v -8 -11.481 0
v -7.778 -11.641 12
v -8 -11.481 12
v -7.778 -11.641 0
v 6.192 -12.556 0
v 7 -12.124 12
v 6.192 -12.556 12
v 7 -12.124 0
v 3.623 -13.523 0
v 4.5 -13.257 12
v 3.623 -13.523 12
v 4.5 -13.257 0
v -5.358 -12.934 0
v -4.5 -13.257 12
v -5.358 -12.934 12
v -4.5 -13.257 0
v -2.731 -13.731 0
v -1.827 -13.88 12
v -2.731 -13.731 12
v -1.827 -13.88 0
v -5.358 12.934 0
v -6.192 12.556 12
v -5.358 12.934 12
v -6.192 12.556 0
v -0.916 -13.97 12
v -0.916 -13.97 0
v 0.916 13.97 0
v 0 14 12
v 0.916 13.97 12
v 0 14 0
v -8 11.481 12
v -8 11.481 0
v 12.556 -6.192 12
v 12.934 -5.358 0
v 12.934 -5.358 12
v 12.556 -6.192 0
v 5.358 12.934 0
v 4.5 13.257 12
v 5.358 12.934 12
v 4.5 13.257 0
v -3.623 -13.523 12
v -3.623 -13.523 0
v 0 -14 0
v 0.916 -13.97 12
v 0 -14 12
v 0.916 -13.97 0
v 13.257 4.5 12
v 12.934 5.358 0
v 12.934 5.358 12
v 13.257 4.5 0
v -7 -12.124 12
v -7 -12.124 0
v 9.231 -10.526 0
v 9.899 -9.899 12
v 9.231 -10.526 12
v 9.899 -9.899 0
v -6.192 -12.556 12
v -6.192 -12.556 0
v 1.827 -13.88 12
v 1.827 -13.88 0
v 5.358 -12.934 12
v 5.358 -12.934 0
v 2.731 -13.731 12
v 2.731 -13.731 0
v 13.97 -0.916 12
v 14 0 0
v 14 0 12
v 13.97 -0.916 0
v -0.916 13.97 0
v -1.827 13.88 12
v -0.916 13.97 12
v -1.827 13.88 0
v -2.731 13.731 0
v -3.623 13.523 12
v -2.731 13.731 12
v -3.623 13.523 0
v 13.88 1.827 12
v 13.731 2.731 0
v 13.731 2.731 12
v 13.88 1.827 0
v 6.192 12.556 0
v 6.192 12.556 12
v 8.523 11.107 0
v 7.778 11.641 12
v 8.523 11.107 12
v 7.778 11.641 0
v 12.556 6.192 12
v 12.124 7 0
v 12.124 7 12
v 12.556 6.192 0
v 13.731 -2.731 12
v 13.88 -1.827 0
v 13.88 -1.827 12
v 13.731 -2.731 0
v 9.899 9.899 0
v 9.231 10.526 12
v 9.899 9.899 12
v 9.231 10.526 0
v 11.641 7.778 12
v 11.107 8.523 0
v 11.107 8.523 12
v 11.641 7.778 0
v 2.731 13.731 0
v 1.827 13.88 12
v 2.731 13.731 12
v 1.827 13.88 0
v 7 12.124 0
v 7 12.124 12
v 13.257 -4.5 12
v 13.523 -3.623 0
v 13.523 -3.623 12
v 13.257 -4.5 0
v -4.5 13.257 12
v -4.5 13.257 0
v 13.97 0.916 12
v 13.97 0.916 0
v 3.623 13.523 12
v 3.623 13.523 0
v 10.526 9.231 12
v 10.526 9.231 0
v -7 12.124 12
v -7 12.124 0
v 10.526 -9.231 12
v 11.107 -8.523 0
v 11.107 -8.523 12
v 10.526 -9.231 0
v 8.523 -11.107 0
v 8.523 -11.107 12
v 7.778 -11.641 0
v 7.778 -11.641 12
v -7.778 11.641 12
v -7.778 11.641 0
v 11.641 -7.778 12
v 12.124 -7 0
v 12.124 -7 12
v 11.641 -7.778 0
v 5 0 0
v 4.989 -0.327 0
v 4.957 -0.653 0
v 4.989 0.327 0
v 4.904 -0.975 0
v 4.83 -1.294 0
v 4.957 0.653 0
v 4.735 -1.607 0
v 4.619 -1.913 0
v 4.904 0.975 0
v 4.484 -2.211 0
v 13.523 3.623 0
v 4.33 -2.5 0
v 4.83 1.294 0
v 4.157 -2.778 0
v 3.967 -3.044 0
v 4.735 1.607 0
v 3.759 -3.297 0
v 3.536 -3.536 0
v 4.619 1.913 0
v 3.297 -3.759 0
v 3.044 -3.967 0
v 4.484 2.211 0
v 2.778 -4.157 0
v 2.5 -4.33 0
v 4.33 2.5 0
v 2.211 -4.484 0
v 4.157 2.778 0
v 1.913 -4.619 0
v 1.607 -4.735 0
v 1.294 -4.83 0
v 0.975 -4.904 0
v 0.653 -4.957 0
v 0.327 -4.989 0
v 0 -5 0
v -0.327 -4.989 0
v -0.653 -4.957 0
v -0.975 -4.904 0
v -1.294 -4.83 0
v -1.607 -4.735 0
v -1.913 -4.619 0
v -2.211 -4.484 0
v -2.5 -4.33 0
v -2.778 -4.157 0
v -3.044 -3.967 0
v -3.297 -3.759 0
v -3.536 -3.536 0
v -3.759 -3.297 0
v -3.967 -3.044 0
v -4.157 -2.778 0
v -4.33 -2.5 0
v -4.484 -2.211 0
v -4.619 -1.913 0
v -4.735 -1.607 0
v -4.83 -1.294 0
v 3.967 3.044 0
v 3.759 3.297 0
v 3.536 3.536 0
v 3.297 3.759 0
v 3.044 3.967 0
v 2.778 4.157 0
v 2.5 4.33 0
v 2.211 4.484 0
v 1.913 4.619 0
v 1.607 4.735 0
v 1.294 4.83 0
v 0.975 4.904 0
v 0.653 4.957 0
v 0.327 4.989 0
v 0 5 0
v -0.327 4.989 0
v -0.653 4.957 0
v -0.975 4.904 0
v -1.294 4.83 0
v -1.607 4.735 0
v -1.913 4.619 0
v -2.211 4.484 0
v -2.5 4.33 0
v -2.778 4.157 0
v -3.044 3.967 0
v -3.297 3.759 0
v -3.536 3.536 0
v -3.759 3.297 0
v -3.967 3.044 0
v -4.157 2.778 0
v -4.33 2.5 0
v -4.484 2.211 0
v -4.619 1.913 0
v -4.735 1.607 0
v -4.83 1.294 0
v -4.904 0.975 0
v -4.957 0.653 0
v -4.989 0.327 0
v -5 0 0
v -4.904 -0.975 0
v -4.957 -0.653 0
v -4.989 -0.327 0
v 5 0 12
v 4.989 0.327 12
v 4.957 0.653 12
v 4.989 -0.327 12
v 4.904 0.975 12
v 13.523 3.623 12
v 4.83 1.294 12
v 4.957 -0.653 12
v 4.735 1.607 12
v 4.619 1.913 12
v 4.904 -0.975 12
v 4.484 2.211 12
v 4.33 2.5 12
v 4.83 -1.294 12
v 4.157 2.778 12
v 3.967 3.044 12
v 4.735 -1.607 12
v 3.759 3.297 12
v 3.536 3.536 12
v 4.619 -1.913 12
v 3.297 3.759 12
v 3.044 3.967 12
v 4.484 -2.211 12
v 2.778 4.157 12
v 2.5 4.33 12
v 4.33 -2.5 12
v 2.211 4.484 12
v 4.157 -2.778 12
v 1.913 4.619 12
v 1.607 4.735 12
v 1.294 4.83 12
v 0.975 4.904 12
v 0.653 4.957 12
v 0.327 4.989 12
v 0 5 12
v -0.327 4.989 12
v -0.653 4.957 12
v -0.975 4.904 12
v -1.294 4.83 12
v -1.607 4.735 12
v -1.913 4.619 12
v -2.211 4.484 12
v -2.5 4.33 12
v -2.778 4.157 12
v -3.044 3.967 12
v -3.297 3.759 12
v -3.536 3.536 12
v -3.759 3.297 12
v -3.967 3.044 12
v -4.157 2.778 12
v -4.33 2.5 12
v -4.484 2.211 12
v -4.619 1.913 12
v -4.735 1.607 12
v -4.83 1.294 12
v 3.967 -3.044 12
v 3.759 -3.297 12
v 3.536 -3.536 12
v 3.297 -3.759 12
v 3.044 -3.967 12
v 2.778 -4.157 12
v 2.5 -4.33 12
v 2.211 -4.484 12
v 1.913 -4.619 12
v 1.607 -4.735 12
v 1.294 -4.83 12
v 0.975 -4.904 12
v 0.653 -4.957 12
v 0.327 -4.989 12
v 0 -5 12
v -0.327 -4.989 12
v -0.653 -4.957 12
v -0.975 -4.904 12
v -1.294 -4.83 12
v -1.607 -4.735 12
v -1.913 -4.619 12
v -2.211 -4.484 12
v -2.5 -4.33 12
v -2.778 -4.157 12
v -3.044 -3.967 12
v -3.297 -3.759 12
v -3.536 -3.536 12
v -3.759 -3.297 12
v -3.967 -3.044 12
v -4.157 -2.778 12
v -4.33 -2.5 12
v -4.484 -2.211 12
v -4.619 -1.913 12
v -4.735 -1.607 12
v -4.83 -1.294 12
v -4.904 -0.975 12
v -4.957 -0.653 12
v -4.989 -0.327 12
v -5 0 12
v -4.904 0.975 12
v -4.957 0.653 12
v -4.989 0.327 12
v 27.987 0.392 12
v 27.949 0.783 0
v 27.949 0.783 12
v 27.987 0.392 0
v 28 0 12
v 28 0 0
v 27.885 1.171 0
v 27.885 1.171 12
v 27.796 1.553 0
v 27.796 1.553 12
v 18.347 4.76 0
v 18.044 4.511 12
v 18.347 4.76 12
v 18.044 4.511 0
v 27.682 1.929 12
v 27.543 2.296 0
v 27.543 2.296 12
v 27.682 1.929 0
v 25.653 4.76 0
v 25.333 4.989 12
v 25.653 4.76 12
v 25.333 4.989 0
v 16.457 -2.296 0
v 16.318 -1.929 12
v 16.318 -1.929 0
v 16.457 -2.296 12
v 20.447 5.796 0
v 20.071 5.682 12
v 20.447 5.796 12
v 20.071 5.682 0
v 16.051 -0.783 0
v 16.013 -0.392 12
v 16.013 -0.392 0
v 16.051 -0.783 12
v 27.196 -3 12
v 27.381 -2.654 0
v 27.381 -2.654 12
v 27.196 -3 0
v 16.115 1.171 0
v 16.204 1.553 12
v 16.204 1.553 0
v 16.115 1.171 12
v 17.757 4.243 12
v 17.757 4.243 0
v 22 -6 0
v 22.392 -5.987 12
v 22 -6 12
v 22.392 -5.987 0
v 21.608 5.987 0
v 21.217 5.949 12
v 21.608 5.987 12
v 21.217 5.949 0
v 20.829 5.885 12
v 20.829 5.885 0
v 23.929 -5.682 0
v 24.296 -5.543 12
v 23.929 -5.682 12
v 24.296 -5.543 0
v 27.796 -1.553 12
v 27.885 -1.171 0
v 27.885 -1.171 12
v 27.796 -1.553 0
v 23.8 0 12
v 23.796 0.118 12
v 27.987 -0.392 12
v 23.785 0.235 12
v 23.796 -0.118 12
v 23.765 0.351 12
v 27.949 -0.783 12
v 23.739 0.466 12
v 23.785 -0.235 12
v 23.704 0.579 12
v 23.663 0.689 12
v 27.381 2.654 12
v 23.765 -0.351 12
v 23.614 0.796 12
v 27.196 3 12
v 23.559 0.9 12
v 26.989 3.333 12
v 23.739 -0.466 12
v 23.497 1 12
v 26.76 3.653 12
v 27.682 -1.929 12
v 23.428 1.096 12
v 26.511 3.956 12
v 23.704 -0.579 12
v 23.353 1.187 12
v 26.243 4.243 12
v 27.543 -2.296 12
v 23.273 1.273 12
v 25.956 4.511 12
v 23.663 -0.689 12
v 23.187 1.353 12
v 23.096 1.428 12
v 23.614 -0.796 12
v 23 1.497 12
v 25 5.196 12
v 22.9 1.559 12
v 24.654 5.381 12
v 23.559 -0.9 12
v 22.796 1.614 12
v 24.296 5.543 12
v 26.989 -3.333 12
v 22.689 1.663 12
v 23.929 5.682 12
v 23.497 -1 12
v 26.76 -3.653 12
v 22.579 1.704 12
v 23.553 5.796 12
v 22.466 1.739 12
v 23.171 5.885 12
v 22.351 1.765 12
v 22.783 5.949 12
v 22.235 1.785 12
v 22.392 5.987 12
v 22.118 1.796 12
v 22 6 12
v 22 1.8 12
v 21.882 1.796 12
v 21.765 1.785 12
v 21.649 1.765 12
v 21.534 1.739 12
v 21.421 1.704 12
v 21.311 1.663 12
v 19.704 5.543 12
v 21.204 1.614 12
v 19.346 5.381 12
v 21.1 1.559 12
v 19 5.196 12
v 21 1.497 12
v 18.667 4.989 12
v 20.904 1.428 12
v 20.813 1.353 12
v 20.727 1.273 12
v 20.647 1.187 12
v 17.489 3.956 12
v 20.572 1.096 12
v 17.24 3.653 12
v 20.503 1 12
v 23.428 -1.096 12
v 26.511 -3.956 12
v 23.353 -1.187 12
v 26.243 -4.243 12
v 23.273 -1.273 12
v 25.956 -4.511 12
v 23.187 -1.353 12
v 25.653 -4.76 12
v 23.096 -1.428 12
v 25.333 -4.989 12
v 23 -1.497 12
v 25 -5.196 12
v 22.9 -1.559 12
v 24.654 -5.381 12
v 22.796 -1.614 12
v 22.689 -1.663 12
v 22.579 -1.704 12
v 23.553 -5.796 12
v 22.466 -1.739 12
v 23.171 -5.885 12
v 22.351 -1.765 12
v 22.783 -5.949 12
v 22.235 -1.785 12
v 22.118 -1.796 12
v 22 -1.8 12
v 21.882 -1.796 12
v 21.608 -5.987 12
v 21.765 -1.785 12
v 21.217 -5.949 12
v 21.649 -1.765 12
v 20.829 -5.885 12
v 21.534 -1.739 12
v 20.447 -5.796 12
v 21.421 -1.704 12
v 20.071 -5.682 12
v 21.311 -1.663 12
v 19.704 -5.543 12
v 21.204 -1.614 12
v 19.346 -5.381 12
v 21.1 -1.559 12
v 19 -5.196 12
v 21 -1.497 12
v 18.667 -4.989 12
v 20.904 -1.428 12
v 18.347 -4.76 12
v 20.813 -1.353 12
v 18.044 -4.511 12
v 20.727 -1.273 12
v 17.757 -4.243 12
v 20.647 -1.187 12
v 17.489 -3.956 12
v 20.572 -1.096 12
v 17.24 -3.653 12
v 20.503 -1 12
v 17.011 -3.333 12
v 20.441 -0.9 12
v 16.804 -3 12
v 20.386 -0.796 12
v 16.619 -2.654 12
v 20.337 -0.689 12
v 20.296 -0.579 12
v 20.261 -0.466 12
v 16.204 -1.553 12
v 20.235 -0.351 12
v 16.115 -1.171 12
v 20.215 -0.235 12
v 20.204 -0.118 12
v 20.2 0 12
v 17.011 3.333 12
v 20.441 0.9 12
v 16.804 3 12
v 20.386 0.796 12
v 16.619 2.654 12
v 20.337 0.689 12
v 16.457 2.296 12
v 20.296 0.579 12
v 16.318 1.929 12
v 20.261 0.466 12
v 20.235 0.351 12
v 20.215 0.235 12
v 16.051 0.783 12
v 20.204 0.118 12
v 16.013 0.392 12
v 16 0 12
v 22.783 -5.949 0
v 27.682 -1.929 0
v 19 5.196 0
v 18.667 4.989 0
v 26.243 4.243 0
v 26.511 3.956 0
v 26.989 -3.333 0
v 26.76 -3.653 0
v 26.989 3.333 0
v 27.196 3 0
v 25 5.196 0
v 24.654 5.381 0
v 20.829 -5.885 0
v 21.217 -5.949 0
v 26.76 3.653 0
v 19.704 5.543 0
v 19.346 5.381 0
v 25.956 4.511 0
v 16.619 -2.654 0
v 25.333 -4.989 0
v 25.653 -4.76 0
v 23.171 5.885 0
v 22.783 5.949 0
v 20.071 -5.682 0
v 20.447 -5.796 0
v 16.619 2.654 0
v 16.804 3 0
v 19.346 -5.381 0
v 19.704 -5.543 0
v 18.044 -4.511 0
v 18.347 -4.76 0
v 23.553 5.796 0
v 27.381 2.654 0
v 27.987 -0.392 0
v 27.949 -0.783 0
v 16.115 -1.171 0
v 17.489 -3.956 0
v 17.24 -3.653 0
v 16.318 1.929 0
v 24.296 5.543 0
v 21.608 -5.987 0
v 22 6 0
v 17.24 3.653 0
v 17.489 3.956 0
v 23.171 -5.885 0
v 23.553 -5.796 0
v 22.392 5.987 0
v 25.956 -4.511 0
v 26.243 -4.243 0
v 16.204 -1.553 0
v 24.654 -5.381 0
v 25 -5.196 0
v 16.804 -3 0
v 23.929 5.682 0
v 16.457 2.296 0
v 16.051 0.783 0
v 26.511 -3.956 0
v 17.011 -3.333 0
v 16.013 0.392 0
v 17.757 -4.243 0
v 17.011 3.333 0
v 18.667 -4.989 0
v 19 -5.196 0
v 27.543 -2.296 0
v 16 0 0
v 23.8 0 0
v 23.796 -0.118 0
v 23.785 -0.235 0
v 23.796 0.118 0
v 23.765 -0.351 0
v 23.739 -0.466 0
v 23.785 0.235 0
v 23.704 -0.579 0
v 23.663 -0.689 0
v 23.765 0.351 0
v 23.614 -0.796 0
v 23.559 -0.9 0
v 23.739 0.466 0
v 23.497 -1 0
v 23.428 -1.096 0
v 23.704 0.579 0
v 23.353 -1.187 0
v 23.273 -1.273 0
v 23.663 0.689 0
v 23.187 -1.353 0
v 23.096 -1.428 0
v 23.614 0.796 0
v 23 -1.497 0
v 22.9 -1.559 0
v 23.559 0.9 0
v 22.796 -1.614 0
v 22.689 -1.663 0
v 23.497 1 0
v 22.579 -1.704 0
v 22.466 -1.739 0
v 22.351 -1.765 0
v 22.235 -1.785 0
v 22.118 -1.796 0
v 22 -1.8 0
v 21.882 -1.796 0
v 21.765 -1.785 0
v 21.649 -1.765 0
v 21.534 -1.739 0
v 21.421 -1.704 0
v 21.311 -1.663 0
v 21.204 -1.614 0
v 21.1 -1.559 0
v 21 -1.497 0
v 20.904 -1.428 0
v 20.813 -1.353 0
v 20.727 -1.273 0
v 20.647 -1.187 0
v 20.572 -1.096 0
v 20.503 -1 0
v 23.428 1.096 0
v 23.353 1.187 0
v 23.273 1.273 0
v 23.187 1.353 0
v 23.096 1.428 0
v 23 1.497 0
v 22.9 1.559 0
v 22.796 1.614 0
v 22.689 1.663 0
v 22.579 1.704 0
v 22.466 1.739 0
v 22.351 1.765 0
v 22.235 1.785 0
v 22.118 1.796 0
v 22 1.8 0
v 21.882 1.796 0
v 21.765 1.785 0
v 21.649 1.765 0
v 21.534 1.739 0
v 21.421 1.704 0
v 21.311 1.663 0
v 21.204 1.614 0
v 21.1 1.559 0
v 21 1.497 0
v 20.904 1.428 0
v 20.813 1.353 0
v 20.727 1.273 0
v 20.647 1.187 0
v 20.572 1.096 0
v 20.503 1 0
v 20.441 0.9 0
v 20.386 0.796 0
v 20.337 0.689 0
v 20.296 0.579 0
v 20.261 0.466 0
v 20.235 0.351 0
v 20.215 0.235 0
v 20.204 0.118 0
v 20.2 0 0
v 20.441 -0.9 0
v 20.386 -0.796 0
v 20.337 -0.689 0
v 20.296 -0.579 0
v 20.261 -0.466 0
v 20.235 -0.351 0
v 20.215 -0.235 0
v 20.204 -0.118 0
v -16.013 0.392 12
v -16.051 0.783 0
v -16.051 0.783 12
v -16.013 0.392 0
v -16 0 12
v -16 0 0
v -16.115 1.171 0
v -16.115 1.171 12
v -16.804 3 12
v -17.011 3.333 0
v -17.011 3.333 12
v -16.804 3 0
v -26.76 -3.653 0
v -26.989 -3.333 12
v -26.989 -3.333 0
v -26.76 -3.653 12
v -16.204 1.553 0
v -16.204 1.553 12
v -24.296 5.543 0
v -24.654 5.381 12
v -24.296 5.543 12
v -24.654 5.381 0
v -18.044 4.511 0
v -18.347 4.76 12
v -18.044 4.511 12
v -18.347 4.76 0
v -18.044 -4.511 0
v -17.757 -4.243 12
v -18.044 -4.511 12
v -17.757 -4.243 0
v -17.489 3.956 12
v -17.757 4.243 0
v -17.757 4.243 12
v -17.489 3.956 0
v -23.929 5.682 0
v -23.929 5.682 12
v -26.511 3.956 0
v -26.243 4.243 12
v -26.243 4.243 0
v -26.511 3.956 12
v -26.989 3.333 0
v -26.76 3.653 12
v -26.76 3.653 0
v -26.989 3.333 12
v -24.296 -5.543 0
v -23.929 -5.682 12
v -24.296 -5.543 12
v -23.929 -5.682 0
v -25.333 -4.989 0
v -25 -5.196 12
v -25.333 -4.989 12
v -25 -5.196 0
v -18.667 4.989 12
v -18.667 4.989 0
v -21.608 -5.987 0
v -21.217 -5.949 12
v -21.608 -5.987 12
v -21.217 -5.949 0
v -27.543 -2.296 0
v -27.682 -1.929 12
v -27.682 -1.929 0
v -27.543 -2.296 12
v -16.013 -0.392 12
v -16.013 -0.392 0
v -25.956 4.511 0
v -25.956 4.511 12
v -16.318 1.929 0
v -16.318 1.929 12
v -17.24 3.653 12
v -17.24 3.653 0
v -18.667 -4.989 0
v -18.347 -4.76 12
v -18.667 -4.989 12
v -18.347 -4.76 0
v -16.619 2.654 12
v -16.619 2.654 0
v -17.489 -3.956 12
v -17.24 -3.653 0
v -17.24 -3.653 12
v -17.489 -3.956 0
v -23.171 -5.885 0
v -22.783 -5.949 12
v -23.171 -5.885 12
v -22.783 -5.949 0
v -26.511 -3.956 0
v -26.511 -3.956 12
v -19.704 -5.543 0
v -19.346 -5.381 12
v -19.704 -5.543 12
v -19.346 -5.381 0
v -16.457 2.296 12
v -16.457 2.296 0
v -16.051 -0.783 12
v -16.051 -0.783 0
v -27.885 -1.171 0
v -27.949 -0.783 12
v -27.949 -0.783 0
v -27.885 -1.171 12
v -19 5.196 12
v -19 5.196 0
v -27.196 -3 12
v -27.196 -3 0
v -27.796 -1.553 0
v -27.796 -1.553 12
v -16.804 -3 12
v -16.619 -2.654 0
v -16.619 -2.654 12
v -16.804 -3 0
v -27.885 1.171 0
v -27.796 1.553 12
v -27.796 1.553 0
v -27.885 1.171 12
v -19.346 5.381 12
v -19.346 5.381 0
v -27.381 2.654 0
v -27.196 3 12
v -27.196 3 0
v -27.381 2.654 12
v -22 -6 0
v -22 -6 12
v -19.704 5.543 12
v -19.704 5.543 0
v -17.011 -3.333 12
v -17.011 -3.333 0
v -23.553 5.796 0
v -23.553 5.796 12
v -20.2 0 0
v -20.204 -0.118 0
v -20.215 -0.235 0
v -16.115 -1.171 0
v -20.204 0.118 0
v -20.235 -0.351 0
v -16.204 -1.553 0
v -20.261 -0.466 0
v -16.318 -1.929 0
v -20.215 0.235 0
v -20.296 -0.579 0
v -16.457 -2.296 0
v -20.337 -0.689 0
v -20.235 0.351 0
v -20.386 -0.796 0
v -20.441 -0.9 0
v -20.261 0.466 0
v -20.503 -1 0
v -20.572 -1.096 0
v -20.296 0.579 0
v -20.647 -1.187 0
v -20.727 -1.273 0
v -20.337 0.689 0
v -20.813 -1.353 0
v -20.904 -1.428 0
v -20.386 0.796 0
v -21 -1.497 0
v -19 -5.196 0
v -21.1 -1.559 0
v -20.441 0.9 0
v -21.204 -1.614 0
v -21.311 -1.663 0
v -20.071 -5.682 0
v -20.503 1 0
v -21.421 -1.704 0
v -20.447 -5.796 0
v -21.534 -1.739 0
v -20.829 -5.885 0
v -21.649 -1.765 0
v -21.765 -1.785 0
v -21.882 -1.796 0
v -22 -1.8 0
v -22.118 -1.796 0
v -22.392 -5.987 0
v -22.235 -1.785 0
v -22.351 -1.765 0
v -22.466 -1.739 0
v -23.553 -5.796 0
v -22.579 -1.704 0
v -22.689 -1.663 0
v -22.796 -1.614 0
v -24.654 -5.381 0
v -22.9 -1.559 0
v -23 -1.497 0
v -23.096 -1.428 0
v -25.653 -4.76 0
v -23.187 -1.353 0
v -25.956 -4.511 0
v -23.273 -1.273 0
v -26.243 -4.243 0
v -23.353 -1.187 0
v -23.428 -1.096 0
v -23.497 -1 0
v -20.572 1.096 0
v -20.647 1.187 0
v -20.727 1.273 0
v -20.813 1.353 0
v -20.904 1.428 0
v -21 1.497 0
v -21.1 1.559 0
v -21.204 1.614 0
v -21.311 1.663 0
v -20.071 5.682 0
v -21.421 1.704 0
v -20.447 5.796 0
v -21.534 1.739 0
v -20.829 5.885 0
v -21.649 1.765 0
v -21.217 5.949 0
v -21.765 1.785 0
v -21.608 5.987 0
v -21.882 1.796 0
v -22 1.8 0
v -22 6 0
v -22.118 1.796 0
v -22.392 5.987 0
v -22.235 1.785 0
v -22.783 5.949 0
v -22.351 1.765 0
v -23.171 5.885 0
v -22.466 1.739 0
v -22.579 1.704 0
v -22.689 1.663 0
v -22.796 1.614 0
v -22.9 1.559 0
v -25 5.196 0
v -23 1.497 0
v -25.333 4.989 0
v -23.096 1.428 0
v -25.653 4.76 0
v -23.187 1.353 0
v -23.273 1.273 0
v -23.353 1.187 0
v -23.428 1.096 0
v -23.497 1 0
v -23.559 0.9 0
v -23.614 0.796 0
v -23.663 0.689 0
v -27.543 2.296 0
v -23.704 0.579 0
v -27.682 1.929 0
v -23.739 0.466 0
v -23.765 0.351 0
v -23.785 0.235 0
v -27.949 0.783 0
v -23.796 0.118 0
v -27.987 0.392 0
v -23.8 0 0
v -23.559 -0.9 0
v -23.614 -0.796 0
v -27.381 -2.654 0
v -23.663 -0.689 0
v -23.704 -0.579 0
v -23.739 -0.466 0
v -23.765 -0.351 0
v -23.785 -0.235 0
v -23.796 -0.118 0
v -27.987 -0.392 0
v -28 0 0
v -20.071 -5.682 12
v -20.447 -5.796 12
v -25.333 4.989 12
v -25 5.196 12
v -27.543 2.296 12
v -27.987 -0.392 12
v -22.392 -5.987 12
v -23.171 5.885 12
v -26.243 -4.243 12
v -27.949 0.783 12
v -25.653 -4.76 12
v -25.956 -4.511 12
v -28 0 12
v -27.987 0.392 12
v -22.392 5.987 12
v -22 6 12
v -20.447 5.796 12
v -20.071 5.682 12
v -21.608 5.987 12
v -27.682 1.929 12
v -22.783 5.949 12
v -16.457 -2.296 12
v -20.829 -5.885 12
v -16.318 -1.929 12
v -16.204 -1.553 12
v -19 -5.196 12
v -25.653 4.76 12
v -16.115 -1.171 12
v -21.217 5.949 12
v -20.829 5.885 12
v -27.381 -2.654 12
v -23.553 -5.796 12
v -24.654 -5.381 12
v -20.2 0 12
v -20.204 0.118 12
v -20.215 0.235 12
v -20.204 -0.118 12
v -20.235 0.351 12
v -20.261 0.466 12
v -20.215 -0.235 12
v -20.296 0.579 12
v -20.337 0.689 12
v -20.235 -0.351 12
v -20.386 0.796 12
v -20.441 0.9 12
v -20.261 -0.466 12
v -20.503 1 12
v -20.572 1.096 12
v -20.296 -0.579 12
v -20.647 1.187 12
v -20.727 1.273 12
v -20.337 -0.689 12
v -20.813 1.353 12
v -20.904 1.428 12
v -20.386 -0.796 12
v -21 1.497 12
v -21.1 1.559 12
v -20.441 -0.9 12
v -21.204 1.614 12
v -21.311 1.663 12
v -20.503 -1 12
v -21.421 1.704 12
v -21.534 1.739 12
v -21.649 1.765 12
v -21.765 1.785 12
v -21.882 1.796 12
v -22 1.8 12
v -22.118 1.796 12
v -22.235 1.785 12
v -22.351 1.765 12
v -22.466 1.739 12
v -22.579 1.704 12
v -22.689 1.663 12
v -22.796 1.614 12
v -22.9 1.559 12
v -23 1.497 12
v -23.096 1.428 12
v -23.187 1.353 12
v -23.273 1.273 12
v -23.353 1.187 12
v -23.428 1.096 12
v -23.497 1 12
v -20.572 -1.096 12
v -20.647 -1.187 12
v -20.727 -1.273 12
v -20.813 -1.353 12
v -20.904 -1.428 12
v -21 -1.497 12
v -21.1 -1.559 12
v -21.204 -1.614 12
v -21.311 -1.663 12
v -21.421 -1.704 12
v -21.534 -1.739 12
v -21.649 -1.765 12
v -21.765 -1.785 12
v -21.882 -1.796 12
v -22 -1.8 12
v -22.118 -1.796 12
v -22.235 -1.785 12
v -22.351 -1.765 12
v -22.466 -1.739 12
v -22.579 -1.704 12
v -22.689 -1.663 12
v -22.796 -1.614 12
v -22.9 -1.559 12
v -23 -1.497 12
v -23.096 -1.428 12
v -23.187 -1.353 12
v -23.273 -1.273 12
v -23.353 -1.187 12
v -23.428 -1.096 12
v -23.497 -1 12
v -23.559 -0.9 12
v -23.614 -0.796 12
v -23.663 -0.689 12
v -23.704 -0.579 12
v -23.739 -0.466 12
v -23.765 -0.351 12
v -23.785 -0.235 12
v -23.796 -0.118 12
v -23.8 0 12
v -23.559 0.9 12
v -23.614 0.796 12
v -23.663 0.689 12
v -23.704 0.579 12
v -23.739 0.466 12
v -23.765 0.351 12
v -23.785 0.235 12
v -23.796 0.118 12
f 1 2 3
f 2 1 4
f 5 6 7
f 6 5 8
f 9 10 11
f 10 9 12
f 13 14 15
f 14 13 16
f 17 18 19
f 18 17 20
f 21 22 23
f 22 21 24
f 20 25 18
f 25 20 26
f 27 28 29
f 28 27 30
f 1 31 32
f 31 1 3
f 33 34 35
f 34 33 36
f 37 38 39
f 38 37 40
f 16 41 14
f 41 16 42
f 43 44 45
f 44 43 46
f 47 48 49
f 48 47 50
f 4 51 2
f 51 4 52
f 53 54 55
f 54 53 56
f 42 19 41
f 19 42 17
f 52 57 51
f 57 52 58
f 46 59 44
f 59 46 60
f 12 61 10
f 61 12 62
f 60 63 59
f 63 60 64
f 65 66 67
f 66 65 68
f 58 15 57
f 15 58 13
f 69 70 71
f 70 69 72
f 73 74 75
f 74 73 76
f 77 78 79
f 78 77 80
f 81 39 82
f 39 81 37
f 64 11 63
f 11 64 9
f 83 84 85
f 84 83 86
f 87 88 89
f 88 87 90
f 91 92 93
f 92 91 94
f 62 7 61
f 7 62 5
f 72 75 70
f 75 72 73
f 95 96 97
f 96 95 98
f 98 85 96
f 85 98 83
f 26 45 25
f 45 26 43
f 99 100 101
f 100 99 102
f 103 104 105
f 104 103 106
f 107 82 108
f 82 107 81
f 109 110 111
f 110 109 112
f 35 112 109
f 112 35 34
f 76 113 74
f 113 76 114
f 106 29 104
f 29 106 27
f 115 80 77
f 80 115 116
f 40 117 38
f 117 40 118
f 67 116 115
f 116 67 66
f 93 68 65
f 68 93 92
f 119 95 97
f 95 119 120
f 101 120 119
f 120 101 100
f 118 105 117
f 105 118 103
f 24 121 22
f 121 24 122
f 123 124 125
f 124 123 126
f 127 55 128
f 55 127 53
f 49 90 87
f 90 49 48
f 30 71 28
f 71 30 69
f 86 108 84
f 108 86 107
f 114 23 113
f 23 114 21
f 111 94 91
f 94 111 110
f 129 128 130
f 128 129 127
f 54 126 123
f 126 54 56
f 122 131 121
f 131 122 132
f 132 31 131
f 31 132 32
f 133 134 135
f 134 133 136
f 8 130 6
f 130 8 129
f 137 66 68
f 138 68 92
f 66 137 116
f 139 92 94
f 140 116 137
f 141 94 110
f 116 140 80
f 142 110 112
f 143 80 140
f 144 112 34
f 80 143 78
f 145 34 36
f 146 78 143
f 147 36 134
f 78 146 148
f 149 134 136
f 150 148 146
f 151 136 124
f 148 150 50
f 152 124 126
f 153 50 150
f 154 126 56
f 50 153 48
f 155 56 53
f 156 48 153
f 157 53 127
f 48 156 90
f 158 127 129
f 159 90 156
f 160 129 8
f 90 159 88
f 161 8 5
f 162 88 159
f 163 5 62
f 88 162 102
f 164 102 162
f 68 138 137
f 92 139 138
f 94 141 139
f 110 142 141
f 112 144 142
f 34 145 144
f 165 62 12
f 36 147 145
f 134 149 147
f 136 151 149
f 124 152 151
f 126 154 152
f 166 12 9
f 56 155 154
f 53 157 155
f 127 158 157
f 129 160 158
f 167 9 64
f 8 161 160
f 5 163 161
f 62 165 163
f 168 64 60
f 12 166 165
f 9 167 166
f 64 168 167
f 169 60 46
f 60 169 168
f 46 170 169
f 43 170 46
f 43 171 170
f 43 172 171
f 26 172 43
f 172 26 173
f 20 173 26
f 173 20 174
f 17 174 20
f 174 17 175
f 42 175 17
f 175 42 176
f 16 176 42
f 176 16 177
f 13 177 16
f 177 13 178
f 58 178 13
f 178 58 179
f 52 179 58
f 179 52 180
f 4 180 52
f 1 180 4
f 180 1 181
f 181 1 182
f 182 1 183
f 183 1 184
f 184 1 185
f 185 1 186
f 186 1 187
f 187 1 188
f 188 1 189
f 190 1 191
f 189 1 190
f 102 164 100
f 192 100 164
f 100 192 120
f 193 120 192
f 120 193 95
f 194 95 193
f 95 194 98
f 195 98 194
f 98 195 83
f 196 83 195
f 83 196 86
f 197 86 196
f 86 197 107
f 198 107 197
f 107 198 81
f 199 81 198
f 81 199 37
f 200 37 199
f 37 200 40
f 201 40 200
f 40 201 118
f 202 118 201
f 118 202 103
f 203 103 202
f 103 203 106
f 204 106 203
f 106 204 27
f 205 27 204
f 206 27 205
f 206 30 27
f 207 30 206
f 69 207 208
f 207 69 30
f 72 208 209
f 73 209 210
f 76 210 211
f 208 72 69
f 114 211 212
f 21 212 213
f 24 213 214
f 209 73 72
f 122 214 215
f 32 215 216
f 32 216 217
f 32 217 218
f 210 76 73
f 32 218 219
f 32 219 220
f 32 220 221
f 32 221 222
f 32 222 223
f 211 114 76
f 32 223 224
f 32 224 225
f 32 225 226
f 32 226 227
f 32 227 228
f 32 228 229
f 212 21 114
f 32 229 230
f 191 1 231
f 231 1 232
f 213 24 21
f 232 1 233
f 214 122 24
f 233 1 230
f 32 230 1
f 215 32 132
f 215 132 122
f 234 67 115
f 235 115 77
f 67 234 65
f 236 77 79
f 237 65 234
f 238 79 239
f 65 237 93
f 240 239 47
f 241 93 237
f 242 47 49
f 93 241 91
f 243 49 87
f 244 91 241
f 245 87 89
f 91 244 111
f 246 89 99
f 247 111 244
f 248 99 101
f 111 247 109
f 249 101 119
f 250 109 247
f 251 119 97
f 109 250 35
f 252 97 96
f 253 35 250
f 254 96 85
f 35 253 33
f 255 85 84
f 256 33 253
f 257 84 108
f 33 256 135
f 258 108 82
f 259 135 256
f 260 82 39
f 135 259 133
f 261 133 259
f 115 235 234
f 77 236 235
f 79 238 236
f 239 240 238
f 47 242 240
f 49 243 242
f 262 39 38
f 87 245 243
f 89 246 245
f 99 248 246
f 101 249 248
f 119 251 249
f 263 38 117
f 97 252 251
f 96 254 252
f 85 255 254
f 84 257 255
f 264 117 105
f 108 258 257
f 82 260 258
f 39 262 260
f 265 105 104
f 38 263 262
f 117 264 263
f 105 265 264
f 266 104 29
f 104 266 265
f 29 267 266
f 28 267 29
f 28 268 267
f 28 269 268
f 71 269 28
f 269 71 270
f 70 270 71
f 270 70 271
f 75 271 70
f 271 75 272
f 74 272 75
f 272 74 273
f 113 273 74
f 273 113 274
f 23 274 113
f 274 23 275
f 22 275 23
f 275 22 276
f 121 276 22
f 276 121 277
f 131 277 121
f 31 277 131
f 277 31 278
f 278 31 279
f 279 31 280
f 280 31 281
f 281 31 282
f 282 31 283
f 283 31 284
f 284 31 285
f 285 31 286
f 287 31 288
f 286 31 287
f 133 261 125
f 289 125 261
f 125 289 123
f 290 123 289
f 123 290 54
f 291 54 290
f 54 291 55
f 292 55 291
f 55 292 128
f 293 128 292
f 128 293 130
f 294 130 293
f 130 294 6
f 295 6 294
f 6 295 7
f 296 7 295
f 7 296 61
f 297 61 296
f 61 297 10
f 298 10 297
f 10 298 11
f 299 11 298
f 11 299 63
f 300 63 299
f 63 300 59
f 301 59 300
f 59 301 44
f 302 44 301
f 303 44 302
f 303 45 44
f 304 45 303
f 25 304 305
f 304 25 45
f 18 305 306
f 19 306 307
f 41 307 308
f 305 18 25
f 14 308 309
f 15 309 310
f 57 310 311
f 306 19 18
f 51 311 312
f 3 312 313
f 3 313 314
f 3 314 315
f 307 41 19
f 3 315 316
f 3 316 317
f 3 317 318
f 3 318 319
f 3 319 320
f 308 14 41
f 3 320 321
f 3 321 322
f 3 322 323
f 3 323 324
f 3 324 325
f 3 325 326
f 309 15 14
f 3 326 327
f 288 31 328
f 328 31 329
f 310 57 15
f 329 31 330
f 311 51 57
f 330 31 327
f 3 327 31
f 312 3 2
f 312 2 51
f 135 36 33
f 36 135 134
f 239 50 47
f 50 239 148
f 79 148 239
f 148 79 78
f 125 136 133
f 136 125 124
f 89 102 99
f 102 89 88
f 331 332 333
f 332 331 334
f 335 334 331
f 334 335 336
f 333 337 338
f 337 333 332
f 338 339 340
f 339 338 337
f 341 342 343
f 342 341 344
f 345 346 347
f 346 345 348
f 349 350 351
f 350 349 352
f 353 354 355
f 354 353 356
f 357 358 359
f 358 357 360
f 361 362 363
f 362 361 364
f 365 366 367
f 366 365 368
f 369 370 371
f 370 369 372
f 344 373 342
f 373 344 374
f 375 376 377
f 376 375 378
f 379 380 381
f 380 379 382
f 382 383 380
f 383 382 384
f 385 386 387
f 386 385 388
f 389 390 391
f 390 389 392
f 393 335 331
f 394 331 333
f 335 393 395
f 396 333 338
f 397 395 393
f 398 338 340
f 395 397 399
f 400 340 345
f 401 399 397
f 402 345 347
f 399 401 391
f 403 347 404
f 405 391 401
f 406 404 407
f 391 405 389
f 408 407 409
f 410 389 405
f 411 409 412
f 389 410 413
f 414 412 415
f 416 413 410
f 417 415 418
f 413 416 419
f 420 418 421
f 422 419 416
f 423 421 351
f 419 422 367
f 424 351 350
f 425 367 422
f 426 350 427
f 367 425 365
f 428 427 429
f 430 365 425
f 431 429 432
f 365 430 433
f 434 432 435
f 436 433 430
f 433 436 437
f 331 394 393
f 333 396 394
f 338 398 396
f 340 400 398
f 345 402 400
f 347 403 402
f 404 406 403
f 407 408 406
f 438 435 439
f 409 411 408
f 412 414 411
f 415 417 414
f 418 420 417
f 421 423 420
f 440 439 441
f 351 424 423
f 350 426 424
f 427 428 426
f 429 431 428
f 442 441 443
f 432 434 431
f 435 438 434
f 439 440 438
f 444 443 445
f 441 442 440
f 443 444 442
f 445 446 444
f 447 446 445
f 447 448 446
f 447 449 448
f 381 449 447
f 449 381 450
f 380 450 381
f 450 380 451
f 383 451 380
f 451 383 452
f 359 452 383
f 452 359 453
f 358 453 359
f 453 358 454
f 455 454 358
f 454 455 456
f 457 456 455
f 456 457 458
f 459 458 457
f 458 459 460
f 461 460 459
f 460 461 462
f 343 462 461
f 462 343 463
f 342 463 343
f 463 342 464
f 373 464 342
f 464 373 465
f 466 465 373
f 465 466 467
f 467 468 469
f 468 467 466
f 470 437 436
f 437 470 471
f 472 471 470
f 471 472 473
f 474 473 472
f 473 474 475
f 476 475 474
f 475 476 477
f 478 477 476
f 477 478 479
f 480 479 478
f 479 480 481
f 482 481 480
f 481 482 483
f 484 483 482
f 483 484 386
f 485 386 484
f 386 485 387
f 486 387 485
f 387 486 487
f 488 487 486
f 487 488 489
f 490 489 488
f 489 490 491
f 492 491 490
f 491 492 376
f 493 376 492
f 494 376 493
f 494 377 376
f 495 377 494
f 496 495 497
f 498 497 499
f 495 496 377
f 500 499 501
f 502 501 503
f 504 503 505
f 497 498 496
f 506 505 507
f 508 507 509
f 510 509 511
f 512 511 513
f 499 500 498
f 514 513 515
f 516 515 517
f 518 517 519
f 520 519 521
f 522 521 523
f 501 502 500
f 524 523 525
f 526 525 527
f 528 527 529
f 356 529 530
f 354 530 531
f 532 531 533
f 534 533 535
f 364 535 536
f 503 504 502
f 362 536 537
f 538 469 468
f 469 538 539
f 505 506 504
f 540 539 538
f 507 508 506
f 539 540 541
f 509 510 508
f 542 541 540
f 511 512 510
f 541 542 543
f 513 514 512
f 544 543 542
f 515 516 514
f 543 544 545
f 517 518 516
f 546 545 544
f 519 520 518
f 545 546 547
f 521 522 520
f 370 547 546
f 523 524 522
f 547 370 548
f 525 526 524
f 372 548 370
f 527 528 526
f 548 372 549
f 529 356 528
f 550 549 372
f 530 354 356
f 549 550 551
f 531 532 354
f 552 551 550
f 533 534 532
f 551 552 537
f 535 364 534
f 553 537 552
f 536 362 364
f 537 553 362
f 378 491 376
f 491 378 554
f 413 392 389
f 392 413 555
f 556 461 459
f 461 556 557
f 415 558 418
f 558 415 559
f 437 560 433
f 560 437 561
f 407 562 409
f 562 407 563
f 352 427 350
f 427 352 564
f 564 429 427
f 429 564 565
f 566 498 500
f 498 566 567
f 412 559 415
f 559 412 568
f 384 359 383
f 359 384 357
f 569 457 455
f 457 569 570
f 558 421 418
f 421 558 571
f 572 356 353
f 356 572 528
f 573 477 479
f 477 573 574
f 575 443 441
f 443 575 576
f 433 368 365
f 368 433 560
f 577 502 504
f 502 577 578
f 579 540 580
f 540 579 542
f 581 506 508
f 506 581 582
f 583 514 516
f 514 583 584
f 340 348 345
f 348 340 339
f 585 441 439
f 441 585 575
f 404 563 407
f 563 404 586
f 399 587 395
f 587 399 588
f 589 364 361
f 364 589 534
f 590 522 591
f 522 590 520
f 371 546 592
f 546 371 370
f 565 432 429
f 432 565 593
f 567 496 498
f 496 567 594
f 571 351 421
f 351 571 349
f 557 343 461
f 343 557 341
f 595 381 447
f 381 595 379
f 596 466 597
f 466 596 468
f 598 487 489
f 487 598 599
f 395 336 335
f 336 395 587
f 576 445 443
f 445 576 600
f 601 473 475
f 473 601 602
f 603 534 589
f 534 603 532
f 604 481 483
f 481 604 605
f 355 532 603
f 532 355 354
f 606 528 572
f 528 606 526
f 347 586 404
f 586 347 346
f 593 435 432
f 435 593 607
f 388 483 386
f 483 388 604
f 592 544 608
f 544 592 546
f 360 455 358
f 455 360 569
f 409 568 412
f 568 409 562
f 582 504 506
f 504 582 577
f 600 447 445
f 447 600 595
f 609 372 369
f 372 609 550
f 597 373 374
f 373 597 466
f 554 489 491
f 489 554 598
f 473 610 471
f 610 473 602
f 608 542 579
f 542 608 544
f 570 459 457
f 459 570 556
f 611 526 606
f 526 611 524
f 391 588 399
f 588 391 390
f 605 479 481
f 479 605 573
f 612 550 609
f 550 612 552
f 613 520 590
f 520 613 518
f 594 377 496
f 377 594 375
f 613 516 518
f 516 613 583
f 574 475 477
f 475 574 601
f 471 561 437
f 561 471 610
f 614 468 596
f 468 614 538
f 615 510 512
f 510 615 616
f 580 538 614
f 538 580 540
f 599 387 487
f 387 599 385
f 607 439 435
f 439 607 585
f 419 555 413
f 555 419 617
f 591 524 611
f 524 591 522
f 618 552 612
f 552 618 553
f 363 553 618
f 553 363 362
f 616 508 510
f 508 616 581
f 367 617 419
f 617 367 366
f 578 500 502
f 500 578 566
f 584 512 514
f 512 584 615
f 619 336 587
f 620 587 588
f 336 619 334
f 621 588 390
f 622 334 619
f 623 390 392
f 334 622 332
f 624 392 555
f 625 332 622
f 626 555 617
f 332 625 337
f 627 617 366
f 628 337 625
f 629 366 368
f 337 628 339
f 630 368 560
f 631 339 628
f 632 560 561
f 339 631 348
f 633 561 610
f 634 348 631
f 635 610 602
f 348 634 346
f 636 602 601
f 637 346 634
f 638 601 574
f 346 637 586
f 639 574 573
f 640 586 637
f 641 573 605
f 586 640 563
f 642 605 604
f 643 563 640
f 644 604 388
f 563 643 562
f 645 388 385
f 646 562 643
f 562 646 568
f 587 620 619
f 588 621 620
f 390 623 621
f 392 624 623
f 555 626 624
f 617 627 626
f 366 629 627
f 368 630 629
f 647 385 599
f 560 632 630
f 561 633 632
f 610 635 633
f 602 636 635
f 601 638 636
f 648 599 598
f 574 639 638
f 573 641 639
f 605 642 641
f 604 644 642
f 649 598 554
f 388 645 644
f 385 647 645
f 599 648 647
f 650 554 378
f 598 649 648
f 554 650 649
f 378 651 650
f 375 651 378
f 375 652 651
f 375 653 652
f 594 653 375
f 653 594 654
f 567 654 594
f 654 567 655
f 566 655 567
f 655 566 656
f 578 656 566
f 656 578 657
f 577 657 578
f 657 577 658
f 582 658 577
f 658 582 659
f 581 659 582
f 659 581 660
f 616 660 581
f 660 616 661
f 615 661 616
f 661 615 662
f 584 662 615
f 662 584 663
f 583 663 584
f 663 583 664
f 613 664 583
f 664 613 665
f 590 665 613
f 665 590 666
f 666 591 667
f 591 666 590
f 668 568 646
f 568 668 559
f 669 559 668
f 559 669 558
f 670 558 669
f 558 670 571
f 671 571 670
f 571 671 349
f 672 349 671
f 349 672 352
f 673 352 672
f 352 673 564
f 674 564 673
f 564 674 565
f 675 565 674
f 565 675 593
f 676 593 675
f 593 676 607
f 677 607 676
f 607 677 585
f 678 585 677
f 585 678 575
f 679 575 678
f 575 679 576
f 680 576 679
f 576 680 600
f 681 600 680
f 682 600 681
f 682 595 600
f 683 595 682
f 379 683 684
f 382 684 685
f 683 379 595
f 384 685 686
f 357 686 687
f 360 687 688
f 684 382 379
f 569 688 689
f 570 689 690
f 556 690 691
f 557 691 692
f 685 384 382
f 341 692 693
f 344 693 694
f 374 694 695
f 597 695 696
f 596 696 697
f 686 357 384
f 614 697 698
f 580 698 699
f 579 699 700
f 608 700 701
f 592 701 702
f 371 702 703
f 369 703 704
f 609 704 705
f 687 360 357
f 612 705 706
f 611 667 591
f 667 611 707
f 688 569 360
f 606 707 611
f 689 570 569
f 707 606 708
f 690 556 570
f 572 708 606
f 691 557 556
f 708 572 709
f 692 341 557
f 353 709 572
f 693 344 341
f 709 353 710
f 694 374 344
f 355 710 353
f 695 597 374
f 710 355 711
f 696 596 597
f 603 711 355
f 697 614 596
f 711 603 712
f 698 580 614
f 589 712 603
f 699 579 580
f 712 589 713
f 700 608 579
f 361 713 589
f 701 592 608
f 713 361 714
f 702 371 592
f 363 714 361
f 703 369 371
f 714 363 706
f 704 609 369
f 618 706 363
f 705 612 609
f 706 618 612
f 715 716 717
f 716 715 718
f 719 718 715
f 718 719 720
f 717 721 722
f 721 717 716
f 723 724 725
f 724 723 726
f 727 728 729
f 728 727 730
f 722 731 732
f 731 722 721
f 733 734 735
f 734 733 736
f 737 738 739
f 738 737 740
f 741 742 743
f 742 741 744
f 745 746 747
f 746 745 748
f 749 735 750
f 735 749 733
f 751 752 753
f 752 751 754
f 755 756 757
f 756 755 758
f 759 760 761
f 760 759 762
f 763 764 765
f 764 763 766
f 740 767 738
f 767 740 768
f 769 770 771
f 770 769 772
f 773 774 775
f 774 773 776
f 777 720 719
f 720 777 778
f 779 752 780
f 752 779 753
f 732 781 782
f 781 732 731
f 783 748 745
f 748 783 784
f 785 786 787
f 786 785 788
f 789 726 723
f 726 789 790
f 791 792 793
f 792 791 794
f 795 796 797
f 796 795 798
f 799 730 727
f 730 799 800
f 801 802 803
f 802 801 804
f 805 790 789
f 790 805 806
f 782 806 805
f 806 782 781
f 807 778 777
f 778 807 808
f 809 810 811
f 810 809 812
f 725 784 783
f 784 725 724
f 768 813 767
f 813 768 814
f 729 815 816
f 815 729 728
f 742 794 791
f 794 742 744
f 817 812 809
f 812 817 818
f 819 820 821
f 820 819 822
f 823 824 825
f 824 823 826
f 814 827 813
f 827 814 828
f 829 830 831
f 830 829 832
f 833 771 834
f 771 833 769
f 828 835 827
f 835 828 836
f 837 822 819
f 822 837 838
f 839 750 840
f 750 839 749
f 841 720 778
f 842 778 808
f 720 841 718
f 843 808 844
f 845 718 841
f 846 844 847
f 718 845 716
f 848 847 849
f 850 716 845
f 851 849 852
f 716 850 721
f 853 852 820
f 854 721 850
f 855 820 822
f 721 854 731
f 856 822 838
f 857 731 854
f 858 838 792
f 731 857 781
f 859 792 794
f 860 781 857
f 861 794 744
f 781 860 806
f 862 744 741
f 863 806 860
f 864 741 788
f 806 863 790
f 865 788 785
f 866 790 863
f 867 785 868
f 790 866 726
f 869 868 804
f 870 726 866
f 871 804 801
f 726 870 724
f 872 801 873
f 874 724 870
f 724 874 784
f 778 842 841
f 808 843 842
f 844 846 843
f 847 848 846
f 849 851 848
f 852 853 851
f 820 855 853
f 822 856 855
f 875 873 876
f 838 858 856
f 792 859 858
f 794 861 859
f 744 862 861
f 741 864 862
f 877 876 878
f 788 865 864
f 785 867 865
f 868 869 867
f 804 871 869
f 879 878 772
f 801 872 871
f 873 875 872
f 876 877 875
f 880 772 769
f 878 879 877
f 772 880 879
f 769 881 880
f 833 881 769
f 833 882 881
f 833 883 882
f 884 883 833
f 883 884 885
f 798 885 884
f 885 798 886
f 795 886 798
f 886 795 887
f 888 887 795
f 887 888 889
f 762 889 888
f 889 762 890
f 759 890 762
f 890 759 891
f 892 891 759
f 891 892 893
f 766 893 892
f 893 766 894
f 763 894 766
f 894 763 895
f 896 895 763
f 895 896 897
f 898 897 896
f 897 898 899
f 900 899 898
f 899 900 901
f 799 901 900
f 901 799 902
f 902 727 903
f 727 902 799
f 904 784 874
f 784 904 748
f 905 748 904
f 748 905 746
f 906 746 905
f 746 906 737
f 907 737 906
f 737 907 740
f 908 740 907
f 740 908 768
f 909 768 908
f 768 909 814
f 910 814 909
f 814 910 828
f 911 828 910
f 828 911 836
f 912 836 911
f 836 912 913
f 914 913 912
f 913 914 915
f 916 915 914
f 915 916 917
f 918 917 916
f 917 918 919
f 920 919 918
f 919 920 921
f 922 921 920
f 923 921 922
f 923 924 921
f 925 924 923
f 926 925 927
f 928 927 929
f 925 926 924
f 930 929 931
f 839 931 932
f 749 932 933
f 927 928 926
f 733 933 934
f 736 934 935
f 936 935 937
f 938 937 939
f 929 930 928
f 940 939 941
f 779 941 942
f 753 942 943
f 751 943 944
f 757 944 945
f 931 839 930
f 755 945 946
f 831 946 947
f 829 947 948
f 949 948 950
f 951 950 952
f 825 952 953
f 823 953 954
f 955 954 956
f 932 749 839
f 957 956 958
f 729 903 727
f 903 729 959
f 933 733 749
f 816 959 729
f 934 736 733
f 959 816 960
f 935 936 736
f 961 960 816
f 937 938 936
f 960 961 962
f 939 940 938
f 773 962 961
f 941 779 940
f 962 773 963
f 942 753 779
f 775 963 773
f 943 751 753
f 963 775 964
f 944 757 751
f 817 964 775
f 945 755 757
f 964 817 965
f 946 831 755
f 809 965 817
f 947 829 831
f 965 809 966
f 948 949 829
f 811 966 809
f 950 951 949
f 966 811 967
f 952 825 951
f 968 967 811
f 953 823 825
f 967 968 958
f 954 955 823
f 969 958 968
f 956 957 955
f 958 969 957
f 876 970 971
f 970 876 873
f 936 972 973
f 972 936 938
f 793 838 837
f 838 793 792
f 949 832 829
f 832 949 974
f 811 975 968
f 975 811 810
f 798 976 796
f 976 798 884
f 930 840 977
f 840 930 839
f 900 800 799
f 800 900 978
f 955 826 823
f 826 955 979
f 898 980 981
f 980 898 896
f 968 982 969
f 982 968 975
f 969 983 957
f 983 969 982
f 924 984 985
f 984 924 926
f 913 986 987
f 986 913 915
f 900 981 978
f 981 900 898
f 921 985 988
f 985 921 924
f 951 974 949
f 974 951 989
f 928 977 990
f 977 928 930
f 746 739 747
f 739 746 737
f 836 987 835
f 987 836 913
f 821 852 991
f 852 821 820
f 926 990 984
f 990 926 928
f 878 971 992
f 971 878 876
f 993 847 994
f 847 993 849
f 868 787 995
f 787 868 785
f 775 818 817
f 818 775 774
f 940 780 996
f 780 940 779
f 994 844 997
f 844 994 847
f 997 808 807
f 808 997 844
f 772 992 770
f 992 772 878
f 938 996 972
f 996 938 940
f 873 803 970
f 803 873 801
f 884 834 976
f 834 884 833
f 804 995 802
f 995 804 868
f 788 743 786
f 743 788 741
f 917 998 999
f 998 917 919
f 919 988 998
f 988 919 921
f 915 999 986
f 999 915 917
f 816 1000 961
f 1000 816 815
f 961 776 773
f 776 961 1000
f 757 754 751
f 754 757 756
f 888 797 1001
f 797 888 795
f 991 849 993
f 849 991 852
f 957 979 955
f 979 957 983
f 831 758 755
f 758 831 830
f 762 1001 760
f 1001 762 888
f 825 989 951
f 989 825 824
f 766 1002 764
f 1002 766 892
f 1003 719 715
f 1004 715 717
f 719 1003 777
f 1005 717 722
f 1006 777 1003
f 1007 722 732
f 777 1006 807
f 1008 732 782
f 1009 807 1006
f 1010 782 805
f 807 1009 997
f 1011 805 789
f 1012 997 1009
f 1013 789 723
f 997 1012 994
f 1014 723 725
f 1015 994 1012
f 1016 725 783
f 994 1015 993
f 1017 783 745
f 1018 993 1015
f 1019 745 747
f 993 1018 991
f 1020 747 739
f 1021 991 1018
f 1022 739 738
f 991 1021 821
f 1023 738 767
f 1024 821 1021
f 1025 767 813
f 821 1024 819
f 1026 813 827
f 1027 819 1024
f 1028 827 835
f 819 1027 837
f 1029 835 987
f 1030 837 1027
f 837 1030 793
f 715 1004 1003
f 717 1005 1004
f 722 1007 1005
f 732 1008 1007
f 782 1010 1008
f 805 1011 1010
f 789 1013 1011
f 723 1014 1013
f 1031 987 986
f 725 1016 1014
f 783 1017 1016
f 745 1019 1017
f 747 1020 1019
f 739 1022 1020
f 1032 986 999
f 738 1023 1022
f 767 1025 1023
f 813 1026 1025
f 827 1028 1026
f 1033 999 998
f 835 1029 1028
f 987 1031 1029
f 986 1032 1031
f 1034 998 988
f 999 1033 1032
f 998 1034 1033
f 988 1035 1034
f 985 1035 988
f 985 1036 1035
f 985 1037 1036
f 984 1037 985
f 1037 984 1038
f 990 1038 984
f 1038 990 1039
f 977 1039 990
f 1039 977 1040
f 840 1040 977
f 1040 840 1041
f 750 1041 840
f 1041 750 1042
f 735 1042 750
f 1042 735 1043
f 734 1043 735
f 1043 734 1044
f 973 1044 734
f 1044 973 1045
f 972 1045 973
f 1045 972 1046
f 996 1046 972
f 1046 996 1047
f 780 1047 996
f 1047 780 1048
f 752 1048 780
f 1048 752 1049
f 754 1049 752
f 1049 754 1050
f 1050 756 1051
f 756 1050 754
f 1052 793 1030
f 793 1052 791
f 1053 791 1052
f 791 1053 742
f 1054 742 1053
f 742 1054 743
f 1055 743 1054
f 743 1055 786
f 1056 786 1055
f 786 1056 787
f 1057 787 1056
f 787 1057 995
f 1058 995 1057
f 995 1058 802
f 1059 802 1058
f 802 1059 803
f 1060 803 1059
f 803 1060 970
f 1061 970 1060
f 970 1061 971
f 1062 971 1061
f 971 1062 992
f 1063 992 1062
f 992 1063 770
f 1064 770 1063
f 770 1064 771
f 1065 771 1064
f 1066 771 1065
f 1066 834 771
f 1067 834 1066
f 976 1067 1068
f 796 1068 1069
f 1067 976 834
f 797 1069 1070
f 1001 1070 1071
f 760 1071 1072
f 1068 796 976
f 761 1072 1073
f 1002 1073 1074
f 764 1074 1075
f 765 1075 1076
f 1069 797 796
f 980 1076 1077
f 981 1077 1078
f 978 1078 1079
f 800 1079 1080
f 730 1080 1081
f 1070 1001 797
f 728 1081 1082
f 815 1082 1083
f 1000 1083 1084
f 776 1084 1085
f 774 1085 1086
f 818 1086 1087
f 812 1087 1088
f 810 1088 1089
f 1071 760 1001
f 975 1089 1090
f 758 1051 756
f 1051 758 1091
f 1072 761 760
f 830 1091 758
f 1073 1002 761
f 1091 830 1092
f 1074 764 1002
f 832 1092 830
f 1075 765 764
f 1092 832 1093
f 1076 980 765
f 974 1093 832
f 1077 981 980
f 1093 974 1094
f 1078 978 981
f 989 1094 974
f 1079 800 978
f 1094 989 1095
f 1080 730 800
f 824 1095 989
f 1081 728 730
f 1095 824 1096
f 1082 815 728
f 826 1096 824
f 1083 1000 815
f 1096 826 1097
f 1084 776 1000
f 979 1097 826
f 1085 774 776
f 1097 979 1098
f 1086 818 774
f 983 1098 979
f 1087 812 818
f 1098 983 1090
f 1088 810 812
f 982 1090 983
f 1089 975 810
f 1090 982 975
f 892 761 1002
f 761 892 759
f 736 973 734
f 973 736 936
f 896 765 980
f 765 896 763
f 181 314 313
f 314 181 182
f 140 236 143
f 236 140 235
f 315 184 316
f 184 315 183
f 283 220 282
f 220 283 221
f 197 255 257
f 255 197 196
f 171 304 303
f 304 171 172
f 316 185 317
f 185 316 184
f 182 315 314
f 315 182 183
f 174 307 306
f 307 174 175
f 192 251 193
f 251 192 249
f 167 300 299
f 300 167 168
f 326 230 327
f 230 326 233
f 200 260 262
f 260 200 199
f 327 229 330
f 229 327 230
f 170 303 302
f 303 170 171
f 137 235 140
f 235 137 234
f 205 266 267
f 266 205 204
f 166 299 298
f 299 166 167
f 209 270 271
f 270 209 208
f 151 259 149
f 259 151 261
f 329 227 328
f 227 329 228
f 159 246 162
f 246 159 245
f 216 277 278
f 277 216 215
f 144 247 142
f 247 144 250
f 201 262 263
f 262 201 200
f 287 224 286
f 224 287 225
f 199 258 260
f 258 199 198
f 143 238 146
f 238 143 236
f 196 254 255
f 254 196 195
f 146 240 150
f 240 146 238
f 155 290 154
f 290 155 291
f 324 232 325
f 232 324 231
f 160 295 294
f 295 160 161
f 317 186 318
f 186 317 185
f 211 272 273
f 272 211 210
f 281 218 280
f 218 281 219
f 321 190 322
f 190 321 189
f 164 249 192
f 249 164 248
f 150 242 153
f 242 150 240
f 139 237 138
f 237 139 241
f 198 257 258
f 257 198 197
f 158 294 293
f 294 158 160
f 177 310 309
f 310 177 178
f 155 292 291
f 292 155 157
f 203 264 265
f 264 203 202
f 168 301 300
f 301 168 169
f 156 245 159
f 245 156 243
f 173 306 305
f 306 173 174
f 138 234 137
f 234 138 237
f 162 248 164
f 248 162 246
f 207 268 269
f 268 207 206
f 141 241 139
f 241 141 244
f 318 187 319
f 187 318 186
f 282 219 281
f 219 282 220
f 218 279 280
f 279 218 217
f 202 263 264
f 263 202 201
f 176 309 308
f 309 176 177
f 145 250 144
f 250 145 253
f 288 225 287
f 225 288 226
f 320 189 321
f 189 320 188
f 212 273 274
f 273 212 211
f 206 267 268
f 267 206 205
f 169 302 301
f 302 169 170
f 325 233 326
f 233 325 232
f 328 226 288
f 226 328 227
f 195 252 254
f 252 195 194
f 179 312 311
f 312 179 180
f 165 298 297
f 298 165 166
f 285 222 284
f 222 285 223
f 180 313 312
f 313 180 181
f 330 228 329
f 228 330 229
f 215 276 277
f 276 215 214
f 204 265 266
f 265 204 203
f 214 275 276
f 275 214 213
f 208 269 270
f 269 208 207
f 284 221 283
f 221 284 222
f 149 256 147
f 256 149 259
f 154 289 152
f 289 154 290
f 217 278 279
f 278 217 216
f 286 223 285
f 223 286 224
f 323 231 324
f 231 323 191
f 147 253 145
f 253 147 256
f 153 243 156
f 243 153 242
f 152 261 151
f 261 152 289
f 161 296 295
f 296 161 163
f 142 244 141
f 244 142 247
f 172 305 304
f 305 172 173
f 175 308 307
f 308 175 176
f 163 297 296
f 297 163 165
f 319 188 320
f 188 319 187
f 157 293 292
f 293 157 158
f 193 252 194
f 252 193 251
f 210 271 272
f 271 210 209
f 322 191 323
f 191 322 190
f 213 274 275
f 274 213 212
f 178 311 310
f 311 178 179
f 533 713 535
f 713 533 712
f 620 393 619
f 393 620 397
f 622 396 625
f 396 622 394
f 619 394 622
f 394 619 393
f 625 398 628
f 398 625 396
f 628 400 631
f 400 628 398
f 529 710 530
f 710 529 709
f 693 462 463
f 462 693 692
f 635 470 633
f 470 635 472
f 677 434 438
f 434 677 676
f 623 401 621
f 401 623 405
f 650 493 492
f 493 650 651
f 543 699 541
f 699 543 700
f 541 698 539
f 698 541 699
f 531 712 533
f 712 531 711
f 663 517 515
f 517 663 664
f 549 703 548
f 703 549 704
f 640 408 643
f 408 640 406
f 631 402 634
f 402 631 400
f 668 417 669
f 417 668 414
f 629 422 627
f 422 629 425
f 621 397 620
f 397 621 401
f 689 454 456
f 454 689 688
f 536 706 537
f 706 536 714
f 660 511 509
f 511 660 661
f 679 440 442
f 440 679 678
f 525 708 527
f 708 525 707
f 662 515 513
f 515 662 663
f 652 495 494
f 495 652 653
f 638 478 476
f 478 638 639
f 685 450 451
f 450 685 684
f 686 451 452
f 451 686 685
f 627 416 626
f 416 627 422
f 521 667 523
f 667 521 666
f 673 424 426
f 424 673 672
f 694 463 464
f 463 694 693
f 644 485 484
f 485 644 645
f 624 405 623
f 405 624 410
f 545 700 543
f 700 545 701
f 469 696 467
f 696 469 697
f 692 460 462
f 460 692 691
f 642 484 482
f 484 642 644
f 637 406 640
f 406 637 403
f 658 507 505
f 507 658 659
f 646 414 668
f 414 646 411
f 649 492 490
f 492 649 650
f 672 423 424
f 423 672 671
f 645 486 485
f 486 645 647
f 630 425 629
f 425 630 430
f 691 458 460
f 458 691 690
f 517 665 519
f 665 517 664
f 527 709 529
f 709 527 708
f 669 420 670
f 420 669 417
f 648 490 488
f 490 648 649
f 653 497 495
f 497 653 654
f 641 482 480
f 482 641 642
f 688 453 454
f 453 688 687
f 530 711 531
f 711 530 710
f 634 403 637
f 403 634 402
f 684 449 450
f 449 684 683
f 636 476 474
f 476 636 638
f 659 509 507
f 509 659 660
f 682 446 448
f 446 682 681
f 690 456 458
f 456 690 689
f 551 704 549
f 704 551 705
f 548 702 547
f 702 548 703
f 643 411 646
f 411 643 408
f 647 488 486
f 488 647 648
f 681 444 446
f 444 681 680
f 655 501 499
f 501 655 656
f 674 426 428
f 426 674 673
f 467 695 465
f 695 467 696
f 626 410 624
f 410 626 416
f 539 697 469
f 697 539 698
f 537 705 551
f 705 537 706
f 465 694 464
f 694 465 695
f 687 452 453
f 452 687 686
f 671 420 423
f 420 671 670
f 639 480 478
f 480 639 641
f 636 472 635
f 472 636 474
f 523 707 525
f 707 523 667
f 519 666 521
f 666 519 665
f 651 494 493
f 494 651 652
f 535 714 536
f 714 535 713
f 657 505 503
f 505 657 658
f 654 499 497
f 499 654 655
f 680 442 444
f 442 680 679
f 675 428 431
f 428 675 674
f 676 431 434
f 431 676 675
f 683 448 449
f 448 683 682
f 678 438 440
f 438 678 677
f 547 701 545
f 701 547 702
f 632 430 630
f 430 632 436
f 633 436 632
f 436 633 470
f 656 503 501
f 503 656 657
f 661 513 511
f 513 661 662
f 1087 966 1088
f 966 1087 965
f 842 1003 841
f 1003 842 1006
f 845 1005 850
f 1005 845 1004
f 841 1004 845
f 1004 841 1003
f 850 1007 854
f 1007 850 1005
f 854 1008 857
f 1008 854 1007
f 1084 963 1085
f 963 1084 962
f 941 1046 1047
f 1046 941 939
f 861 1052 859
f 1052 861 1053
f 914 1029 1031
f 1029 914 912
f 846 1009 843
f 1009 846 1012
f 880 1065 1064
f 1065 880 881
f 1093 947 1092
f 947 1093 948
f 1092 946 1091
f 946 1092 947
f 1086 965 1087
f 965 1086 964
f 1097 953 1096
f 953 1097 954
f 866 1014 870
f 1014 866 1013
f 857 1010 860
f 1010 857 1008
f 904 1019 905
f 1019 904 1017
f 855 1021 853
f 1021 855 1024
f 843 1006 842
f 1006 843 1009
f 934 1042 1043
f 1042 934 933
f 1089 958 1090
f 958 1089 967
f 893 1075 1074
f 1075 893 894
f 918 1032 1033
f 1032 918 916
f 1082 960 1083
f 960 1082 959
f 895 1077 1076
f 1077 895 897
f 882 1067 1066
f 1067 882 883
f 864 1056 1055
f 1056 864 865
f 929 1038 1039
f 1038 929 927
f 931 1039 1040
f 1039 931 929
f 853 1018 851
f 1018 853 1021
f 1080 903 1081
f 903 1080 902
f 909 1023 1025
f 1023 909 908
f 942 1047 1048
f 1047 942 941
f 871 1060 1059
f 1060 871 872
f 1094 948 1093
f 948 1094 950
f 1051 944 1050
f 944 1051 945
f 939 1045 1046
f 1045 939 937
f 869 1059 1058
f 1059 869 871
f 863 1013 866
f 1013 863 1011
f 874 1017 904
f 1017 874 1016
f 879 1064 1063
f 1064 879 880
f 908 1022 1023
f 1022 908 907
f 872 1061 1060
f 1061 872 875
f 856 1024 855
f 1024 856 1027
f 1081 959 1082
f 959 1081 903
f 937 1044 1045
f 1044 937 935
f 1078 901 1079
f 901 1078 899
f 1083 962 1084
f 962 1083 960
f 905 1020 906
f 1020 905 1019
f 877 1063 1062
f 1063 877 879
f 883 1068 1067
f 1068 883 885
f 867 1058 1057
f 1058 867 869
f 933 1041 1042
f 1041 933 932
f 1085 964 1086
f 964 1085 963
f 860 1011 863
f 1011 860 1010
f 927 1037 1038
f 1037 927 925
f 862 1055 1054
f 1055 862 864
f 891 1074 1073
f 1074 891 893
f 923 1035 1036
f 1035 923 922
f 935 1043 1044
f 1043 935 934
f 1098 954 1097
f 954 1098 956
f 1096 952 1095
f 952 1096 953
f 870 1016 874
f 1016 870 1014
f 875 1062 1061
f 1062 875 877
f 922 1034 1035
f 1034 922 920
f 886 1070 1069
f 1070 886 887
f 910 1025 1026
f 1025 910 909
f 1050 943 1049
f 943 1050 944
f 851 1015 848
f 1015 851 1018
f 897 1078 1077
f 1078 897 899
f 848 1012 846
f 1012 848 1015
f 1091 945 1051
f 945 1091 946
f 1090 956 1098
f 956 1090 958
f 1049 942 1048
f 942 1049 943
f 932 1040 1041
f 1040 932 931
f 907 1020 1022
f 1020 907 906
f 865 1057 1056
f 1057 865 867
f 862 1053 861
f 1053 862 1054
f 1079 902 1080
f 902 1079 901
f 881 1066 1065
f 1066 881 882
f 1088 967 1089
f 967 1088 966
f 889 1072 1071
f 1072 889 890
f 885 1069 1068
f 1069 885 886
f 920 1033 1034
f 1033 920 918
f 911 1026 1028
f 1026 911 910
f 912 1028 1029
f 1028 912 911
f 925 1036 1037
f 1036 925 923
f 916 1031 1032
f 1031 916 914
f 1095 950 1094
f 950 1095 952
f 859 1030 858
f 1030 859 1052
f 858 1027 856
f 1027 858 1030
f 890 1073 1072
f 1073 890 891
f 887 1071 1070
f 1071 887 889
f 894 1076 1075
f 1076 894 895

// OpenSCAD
$fn = 96;

// "D" connector: a D-shaped body with a centered through-hole and two mounting ears with screw holes.

body_thickness = 12;
body_radius = 14;          // radius for the rounded side
flat_width = 22;           // width across the flat side to the farthest point on the curve
ear_radius = 6;
ear_offset = 22;           // distance from center to ear centers along X
ear_thickness = body_thickness;

main_hole_d = 10;          // central connector hole
ear_hole_d  = 3.6;         // mounting screw holes

module d_profile(r=14, flat_w=22){
    // D shape: circle clipped by a vertical line to create a flat side.
    // Circle centered at origin; flat side at x = -(flat_w - r)
    intersection() {
        circle(r=r);
        translate([-(flat_w - r), -r]) square([flat_w, 2*r], center=false);
    }
}

module d_body(){
    linear_extrude(height=body_thickness)
        d_profile(r=body_radius, flat_w=flat_width);
}

module ear(){
    cylinder(h=ear_thickness, r=ear_radius);
}

difference() {
    union() {
        // Main D body
        d_body();

        // Mounting ears (left/right)
        translate([ ear_offset, 0, 0]) ear();
        translate([-ear_offset, 0, 0]) ear();
    }

    // Central through-hole
    translate([0, 0, -1])
        cylinder(h=body_thickness+2, d=main_hole_d);

    // Ear screw holes
    translate([ ear_offset, 0, -1])
        cylinder(h=ear_thickness+2, d=ear_hole_d);
    translate([-ear_offset, 0, -1])
        cylinder(h=ear_thickness+2, d=ear_hole_d);
}
